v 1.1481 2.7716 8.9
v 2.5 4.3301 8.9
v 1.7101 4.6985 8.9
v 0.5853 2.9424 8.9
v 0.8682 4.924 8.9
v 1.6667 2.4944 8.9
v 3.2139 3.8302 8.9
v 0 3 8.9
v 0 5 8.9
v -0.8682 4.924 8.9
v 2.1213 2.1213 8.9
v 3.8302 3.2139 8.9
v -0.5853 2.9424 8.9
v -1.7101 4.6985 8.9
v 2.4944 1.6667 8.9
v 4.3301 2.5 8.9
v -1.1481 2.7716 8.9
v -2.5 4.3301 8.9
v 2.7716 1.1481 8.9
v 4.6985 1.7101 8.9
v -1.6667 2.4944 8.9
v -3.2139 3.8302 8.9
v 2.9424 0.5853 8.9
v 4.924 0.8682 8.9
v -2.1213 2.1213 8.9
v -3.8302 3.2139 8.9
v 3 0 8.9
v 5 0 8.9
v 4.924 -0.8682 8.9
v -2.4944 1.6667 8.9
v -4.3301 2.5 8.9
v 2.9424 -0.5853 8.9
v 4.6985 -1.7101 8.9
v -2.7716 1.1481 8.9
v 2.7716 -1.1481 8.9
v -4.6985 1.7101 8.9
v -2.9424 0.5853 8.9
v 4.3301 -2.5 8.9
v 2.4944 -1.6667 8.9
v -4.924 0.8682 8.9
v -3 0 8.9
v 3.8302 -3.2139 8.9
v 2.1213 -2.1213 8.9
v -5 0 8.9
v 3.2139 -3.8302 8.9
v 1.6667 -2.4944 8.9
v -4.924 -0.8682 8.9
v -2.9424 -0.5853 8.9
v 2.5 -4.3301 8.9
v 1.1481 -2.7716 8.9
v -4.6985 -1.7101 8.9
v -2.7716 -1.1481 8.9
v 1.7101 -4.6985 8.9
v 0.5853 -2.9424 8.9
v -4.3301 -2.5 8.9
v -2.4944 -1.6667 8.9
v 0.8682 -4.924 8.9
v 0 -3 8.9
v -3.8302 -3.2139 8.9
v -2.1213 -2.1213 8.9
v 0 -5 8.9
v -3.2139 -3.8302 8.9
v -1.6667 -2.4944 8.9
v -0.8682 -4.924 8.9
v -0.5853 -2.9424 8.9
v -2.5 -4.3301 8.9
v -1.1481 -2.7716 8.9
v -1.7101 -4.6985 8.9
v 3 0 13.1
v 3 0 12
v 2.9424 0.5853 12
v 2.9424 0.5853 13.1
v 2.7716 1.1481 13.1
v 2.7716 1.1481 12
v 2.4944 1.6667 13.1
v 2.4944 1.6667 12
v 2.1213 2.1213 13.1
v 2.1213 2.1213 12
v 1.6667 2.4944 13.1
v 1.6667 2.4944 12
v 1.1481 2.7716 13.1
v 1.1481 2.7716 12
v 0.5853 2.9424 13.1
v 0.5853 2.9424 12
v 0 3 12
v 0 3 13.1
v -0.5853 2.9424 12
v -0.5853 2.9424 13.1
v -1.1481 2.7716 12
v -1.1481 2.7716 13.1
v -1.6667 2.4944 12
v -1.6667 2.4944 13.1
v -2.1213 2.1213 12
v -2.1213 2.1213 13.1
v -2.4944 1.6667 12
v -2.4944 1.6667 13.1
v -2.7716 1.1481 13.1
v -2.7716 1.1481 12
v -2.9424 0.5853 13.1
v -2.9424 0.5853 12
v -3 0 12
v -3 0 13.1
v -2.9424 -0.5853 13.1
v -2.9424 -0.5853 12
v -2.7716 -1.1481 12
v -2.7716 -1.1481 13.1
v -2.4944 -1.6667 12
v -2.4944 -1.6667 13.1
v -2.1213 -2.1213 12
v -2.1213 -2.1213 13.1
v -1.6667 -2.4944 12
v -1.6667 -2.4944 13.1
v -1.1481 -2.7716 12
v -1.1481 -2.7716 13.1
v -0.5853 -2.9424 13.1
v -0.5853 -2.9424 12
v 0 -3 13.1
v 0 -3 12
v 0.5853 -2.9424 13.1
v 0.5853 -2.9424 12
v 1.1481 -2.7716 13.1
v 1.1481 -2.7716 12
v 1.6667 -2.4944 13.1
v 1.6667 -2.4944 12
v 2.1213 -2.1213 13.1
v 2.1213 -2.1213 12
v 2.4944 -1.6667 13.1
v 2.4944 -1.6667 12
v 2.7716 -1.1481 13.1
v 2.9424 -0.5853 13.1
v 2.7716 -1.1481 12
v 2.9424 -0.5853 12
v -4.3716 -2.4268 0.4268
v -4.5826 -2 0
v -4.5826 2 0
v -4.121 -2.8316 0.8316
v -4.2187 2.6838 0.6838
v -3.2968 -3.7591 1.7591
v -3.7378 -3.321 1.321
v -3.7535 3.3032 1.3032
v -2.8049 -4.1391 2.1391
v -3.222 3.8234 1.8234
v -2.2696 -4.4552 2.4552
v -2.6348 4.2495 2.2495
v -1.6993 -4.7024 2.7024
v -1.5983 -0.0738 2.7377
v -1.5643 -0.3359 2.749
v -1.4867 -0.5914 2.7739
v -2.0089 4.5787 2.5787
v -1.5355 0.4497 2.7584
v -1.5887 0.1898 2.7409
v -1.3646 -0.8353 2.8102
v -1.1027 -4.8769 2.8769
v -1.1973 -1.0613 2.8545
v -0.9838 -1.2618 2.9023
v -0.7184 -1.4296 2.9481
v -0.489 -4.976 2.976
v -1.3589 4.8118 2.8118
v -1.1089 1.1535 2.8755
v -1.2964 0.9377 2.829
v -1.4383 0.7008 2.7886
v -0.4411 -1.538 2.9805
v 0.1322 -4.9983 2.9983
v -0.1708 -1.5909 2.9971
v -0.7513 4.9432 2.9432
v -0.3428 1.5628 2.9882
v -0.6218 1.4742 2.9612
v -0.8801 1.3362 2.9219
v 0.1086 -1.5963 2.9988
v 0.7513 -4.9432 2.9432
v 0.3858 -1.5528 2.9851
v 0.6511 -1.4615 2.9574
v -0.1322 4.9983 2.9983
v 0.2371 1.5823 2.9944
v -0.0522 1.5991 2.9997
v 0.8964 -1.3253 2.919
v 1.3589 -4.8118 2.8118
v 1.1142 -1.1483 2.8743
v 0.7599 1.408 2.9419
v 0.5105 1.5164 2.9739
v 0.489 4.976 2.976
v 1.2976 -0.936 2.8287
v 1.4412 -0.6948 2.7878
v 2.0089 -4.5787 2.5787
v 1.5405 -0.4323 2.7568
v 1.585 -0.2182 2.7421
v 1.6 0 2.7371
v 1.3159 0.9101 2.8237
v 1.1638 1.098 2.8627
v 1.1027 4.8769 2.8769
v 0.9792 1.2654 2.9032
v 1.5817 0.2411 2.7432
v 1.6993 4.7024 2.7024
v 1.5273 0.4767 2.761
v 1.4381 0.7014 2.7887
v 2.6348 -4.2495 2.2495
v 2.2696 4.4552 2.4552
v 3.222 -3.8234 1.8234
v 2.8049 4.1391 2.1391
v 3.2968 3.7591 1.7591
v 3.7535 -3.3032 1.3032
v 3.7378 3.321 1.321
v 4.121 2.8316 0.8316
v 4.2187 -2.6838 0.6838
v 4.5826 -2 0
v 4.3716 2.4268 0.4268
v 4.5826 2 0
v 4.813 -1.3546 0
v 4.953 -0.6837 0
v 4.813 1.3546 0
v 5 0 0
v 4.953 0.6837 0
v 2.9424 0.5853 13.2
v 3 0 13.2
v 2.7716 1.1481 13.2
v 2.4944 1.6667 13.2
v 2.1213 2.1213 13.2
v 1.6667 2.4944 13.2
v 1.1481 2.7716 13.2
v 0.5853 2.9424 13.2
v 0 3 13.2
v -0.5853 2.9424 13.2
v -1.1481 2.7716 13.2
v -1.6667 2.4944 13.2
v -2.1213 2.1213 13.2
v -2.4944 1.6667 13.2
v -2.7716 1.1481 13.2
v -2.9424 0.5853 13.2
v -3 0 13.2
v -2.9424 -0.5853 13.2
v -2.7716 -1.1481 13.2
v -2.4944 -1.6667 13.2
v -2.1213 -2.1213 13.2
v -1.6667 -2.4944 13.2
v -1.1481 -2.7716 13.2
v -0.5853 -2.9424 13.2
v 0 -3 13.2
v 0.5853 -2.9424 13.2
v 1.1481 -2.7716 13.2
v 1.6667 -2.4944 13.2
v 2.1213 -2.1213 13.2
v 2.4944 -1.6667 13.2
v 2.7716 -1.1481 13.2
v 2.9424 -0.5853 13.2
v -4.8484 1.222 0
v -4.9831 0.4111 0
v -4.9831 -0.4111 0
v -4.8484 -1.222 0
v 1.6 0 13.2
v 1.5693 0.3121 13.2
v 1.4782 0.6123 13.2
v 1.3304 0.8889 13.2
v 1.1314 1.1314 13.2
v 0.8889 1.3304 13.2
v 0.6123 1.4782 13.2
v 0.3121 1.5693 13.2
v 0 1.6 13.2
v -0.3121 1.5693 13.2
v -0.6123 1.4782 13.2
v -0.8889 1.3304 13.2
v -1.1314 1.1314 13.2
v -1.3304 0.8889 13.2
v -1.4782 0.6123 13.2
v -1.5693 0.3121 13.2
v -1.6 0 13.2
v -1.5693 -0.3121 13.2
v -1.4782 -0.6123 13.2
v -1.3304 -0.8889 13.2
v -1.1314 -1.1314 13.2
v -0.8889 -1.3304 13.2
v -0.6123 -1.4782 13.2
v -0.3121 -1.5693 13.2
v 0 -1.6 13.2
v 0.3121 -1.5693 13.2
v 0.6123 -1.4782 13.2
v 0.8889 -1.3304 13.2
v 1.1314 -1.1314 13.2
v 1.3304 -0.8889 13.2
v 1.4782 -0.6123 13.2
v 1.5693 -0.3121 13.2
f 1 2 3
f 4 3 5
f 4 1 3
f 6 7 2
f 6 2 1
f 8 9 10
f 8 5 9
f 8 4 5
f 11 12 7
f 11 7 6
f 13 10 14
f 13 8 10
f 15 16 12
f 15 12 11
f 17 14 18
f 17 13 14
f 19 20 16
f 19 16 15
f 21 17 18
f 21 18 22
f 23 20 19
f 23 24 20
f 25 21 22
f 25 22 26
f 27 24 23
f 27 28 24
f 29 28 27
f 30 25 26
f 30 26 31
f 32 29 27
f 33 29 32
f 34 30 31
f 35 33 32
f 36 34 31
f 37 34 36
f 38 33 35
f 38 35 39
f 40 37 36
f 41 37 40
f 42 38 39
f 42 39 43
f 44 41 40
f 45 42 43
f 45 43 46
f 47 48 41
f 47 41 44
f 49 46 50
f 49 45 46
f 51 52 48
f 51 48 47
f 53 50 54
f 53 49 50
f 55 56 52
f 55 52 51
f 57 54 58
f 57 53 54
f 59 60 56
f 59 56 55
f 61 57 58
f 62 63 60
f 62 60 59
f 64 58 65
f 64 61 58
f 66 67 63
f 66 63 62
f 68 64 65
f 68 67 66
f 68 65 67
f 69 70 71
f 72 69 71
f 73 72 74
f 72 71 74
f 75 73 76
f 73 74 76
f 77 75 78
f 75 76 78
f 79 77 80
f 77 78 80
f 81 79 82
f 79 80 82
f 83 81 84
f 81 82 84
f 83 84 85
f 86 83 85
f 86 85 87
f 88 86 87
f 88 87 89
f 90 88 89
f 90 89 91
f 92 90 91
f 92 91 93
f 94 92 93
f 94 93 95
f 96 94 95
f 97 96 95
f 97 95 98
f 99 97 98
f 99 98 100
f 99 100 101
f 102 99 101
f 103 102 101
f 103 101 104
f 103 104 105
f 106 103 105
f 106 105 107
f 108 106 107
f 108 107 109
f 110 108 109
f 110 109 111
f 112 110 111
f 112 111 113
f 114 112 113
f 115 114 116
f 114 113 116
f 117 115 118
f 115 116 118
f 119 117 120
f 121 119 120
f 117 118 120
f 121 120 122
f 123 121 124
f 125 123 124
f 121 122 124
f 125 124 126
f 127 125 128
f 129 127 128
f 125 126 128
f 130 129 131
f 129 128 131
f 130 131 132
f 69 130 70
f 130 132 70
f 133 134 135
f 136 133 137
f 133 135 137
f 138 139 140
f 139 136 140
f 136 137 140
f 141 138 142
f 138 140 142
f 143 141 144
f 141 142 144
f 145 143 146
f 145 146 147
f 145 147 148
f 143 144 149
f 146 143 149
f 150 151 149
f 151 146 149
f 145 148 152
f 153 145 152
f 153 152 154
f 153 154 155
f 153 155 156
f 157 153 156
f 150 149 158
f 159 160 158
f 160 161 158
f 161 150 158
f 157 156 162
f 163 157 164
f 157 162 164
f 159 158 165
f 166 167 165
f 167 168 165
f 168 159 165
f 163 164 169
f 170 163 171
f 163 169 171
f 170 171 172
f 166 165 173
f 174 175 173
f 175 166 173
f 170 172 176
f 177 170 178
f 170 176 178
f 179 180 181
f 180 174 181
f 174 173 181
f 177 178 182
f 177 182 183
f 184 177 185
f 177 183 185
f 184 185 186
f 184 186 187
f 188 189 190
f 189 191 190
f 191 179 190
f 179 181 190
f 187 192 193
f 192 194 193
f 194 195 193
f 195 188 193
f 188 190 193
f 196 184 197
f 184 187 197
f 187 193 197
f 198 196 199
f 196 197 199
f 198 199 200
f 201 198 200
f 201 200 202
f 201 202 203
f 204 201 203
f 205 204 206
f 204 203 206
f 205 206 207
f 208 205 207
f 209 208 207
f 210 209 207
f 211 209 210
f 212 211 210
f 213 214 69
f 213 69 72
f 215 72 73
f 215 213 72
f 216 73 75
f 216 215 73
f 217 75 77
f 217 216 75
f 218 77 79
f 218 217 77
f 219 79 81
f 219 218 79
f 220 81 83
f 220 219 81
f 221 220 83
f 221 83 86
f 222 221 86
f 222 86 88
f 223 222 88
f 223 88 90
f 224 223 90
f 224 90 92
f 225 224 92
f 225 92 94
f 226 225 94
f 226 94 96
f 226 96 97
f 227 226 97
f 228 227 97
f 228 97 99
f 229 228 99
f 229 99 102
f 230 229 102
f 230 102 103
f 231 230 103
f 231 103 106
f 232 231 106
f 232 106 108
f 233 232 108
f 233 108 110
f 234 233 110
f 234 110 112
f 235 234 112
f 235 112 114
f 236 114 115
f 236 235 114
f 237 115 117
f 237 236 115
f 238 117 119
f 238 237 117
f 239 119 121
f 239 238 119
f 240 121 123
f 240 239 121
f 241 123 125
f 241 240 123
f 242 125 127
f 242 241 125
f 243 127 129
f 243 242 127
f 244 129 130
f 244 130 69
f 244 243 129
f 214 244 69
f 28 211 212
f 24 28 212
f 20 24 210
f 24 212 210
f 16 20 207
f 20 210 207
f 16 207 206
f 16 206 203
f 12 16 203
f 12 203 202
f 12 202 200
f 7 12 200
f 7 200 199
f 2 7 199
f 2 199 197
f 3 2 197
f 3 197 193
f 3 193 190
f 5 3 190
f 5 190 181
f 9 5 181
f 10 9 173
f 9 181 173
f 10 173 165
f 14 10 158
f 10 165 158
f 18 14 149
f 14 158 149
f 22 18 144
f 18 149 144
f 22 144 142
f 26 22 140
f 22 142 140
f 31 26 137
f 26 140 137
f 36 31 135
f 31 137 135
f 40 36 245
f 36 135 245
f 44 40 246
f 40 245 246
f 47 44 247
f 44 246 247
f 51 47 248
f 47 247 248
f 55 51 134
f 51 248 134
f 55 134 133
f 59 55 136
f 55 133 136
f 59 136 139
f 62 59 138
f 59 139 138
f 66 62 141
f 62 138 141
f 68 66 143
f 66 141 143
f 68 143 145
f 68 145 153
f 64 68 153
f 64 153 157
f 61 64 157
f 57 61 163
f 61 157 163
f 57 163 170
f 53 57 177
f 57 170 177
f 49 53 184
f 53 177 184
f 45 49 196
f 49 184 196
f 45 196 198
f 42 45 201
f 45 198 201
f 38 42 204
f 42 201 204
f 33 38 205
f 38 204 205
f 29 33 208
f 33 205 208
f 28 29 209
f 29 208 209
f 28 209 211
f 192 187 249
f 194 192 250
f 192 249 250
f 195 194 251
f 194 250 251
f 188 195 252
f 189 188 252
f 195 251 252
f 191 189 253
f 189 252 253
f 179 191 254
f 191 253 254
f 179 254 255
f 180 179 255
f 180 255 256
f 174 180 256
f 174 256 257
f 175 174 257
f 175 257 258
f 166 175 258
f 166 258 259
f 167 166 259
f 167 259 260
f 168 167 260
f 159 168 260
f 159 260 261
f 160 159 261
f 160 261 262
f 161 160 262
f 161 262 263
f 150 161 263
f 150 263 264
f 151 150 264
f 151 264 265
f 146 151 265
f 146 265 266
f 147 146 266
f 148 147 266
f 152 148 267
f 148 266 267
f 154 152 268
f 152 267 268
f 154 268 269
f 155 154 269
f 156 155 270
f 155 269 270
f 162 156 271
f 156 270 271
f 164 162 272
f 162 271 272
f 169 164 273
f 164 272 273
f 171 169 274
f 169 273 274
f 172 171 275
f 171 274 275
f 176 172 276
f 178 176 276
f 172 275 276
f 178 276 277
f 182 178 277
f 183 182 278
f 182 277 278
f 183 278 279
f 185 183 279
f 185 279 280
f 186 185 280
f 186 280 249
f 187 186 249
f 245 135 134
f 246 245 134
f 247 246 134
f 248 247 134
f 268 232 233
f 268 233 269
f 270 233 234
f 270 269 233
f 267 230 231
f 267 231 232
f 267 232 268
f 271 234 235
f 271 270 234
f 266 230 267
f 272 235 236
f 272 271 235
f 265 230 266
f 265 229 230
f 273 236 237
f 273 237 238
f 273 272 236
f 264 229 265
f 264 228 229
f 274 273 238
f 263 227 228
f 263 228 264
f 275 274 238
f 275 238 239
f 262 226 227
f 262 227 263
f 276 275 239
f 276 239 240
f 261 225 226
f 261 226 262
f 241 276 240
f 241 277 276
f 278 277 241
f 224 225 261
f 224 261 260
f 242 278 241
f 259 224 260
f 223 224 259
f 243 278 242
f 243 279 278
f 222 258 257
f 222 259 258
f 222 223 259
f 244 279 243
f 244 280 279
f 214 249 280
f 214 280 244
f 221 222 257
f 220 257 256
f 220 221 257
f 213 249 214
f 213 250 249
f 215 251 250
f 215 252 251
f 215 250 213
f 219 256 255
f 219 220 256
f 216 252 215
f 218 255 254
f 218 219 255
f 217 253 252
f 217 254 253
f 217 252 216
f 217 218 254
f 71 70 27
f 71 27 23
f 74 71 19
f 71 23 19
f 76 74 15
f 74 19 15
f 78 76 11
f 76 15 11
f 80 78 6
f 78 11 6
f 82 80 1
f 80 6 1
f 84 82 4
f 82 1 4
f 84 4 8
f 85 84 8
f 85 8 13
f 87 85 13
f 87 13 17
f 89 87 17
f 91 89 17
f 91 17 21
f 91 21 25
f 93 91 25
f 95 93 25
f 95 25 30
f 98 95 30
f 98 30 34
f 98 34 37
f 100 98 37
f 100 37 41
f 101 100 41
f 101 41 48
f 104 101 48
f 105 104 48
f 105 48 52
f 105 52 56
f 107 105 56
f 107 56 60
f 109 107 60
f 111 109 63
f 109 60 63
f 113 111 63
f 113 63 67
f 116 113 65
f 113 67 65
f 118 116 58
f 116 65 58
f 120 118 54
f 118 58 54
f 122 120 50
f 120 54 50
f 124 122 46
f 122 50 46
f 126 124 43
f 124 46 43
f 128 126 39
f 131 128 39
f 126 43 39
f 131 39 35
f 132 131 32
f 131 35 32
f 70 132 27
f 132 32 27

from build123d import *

# Parameters (mm, degrees)
SKETCH_1_R          = 5
EXTRUDE_1_DEPTH     = 15
CUT_EXTRUDE_START   = -4
SKETCH_2_R          = 5
SKETCH_2_R_2        = 3
CUT_EXTRUDE_1_DEPTH = 4
SKETCH_3_R          = 5
CUT_EXTRUDE_2_DEPTH = 25
SKETCH_4_R          = 1.6
CUT_EXTRUDE_3_DEPTH = 17.583123952
SKETCH_5_R          = 5
SKETCH_5_R_2        = 3
CUT_EXTRUDE_4_DEPTH = 2.1
SKETCH_6_OUTSIDE_W  = 16.124
SKETCH_6_OUTSIDE_H  = 16.124
SKETCH_6_OUTSIDE_R  = 3
CUT_EXTRUDE_5_DEPTH = 3
CUT_EXTRUDE_START_2 = -1.8
SKETCH_7_R          = 3
CUT_EXTRUDE_6_DEPTH = 1.8


with BuildPart() as part:
    # 草图1 → 凸台-拉伸1 (new body)
    with BuildSketch(Plane.XY):
        Circle(SKETCH_1_R)
    extrude(amount=EXTRUDE_1_DEPTH)

    # 草图2 → 切除-拉伸1 (cut)
    with BuildSketch(Plane.XY.offset(13).offset(CUT_EXTRUDE_START)):
        Circle(SKETCH_2_R)
        Circle(SKETCH_2_R_2, mode=Mode.SUBTRACT)
    extrude(amount=CUT_EXTRUDE_1_DEPTH, mode=Mode.SUBTRACT)

    # 草图3 → 切除-拉伸2 (cut, symmetric)
    with BuildSketch(Plane(origin=(0, 0, 0), x_dir=(1, 0, 0), z_dir=(0, 1, 0))):
        with Locations((0, 2)):
            Circle(SKETCH_3_R)
    extrude(amount=CUT_EXTRUDE_2_DEPTH, both=True, mode=Mode.SUBTRACT)

    # 草图4 → 切除-拉伸3 (cut, through all)
    with BuildSketch(Plane.XY.offset(15)):
        Circle(SKETCH_4_R)
    extrude(amount=-CUT_EXTRUDE_3_DEPTH, mode=Mode.SUBTRACT)

    # 草图5 → 切除-拉伸4 (cut, symmetric)
    with BuildSketch(Plane.XY.offset(11)):
        with Locations(Location((0, 0, 0), (0, 0, 203.578178478))):
            Circle(SKETCH_5_R)
        Circle(SKETCH_5_R_2, mode=Mode.SUBTRACT)
    extrude(amount=CUT_EXTRUDE_4_DEPTH, both=True, mode=Mode.SUBTRACT)

    # 草图6 outside → 切除-拉伸5 (cut)
    with BuildSketch(Plane.XY.offset(15)):
        Rectangle(SKETCH_6_OUTSIDE_W, SKETCH_6_OUTSIDE_H)
        Circle(SKETCH_6_OUTSIDE_R, mode=Mode.SUBTRACT)
    extrude(amount=-CUT_EXTRUDE_5_DEPTH, mode=Mode.SUBTRACT)

    # 草图7 → 切除-拉伸6 (cut)
    with BuildSketch(Plane.XY.offset(15).offset(CUT_EXTRUDE_START_2)):
        Circle(SKETCH_7_R)
    extrude(amount=CUT_EXTRUDE_6_DEPTH, mode=Mode.SUBTRACT)


solid = part.part
